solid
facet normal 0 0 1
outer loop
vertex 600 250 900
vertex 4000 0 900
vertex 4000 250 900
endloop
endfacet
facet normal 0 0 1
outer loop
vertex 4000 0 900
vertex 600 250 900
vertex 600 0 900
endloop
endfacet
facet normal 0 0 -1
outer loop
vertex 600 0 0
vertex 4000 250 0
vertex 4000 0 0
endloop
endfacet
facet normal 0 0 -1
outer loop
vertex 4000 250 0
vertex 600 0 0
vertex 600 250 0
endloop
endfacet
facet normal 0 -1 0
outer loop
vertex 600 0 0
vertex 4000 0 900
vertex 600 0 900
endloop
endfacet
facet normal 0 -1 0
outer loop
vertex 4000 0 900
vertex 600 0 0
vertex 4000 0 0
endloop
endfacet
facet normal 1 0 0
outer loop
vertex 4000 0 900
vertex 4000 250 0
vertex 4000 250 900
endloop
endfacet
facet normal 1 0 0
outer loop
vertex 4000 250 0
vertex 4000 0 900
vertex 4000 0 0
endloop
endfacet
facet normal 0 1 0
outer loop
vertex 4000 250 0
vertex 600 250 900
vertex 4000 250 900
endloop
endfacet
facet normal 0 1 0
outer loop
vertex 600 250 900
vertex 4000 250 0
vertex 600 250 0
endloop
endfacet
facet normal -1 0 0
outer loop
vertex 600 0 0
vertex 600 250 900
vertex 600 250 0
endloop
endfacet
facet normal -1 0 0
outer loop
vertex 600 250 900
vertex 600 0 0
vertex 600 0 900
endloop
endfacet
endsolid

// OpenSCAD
// file: tea_shop_parameters.scad
// =============================================================================
// Tea Shop — SHARED PARAMETERS (Base & Shell)
// -----------------------------------------------------------------------------
// OpenSCAD's native unit is 1 mm, so every value here is the REAL-LIFE size
// in millimetres (1000 mm = 1 m). E.g. building_width = 6000 means 6.0 m.
//
// For MLO / FiveM (which uses metres as 1 unit = 1 m), either:
//   (a) export each STL here and re-import at a scale of 0.001 (mm -> m), or
//   (b) model in metres directly by dividing every value below by 1000.
//
// Tune each value here; every module pulls its size from these variables.
// =============================================================================


// --- building shell / roof (lean-to: TALL back, SHORT front eave) -----------
wall_thickness    = 250;   // wall panel thickness                      (0.25 m)
building_width    = 6000;  // X extent, left wall -> right wall          (6.00 m)
building_depth    = 4000;  // Y extent, front eave -> back wall          (4.00 m)
back_height       = 3200;  // full wall height at the BACK (tall side)   (3.20 m)
front_eave_height = 2400;  // wall height at the FRONT eave (short side) (2.40 m)

// --- front wall openings (service window + door), measured along X ----------
left_pier_width   = 600;   // solid pier left of the service window      (0.60 m)
window_width      = 3400;  // service window opening width — made WIDE   (3.40 m)
mid_pier_width    = 500;   // solid pier between window and door         (0.50 m)
door_width        = 1000;  // door opening width                         (1.00 m)
sill_height       = 900;   // knee-wall (sill) height beneath the window (0.90 m)

// --- base slab / plinth ------------------------------------------------------
base_thickness    = 200;   // vertical thickness of the ground plinth    (0.20 m)
base_side_margin  = 900;   // slab overhang beyond left/right walls      (0.90 m)
base_back_margin  = 600;   // slab overhang behind the back wall         (0.60 m)
base_front_margin = 3000;  // extra slab in FRONT = porch/patio (pergola)(3.00 m)


// -----------------------------------------------------------------------------
// DERIVED DIMENSIONS (do not edit — computed from the values above)
// -----------------------------------------------------------------------------

// front-wall pier chain, left -> right, must sum exactly to building_width
window_left      = left_pier_width;                    // X where the window starts
window_right     = window_left + window_width;         // X where the window ends
door_left        = window_right + mid_pier_width;      // X where the door starts
door_right       = door_left + door_width;             // X where the door ends
right_pier_width = building_width - door_right;        // fills the rest to the corner

// window opening rises from the top of the sill up to the front eave line
window_open_height = front_eave_height - sill_height;
// file: tea_shop_modules.scad
// =============================================================================
// Tea Shop — MODULE LIBRARY (Base & Shell)
// -----------------------------------------------------------------------------
// This file only DEFINES the parts (and the assemble() preview). It instantiates
// NO geometry on its own, so it can be include'd by the individual export files
// (part_*.scad) and by tea_shop_assemble.scad without producing duplicates.
//
// GLOBAL COORDINATE SYSTEM (shared by every piece — no per-part centering):
//   +X -> left -> right  (building WIDTH along X, left wall at X=0)
//   +Y -> front -> back  (building DEPTH along Y, front eave at Y=0)
//   +Z -> up             (ground/porch surface = Z=0)
//
//   Building footprint = [0..building_width] x [0..building_depth].
//   Roof = single-pitch lean-to: TALL at BACK (Y=depth), SHORT at FRONT (Y=0).
// =============================================================================

include <tea_shop_parameters.scad>;


// -----------------------------------------------------------------------------
// _trapezoid_prism — shared core for the two side walls. It draws the side
// elevation (depth x height) as a 2D polygon, then linear_extrude +
// rotate([0,-90,0]) stand it up so its thickness runs along X. The front edge
// (Y=0) is the short eave height and the back edge (Y=depth) is the full back
// height, so the top edge automatically matches the roof pitch. Result
// occupies X = [0 .. wall_thickness].
// -----------------------------------------------------------------------------
module _trapezoid_prism() {
    translate([wall_thickness, 0, 0])
        rotate([0, -90, 0])
            linear_extrude(height = wall_thickness)
                polygon(points = [
                    [0,                 0],               // front, ground
                    [0,                 building_depth],  // back,  ground
                    [back_height,       building_depth],  // back,  top (tall)
                    [front_eave_height, 0]                // front, top (eave)
                ]);
}


// =============================================================================
// base_slab — flat ground plinth. Extends past the building on all sides, with
// a generous margin up front to form the porch/patio where the bench / stools
// sit under the pergola. Top surface is the datum Z=0.
// =============================================================================
module base_slab() {
    translate([-base_side_margin, -base_front_margin, -base_thickness])
        cube([
            building_width + 2 * base_side_margin,                 // X
            building_depth + base_front_margin + base_back_margin, // Y
            base_thickness                                          // Z
        ]);
}


// =============================================================================
// back_wall — solid rectangular panel, full building width and FULL height
// (the tall side of the lean-to). Sits at the back edge of the footprint.
// =============================================================================
module back_wall() {
    translate([0, building_depth - wall_thickness, 0])
        cube([building_width, wall_thickness, back_height]);
}


// =============================================================================
// left_side_wall — trapezoidal panel, TALL at the back edge and SHORT at the
// front edge, matching the roof slope. Occupies X = [0 .. wall_thickness].
// =============================================================================
module left_side_wall() {
    _trapezoid_prism();
}


// =============================================================================
// right_side_wall — mirror image of the left wall (identical trapezoid cross
// section, since both walls slope down toward the FRONT eave), placed at the
// right edge X = [building_width - wall_thickness .. building_width].
// Plain — no openings.
// =============================================================================
module right_side_wall() {
    translate([building_width - wall_thickness, 0, 0])
        _trapezoid_prism();
}


// =============================================================================
// FRONT WALL — broken into solid piers + a knee-wall (sill), leaving a service
// window opening and a door opening. Every front piece tops out at the front
// eave height (the horizontal line where the roof meets the front wall).
//
//   |<- left ->|<--- window --->|<- mid ->|<-- door -->|<- right ->|
//   |   pier   |    (opening)   |   pier  |  (opening)  |   pier   |
//   |          |   [sill below] |         |             |          |
// =============================================================================

// front_wall_left_pier — solid pier left of the service window, ground to eave.
module front_wall_left_pier() {
    translate([0, 0, 0])
        cube([left_pier_width, wall_thickness, front_eave_height]);
}


// front_wall_sill — the low knee-wall beneath the service window opening.
// The window opening sits above it.
// TODO: counter + window frame modules slot in above this sill (later group).
module front_wall_sill() {
    translate([window_left, 0, 0])
        cube([window_width, wall_thickness, sill_height]);
}


// front_wall_mid_pier — solid pier between the window and the door, full height.
module front_wall_mid_pier() {
    translate([window_right, 0, 0])
        cube([mid_pier_width, wall_thickness, front_eave_height]);
}


// front_wall_right_pier — solid pier right of the door, out to the front corner.
// Width is derived so the pier chain always ends flush with the right corner.
module front_wall_right_pier() {
    translate([door_right, 0, 0])
        cube([right_pier_width, wall_thickness, front_eave_height]);
}


// -----------------------------------------------------------------------------
// OPENING ANNOTATIONS (for reference — these are EMPTY volumes in the shell):
//
//   Service window opening:
//     X = [window_left .. window_right], Z = [sill_height .. front_eave_height]
//     TODO: window frame + service counter modules slot in here (later group).
//
//   Door opening:
//     X = [door_left .. door_right], Z = [0 .. front_eave_height] (full height)
//     TODO: door / door-frame module slots in here (later group).
// -----------------------------------------------------------------------------


// =============================================================================
// assemble — visual verification ONLY (not for export). Shows every piece in
// the shared coordinate system, each in its own colour, so the assembled shell
// can be checked against the reference before exporting individual STLs.
// =============================================================================
module assemble() {
    color("LightGray")  base_slab();

    color("SkyBlue")    back_wall();
    color("Orange")     left_side_wall();
    color("Orange")     right_side_wall();

    color("FireBrick")  front_wall_left_pier();
    color("Peru")       front_wall_sill();
    color("FireBrick")  front_wall_mid_pier();
    color("FireBrick")  front_wall_right_pier();
}
// main file
// =============================================================================
// part_front_wall_sill.scad — export the FRONT WALL SILL (knee-wall) only.
// Open this file, press F6 (render), then export as STL. Everything sits in the
// shared global coordinate system, so re-importing all parts together lines up
// automatically with no manual repositioning.
// =============================================================================

include <tea_shop_modules.scad>;

front_wall_sill();
